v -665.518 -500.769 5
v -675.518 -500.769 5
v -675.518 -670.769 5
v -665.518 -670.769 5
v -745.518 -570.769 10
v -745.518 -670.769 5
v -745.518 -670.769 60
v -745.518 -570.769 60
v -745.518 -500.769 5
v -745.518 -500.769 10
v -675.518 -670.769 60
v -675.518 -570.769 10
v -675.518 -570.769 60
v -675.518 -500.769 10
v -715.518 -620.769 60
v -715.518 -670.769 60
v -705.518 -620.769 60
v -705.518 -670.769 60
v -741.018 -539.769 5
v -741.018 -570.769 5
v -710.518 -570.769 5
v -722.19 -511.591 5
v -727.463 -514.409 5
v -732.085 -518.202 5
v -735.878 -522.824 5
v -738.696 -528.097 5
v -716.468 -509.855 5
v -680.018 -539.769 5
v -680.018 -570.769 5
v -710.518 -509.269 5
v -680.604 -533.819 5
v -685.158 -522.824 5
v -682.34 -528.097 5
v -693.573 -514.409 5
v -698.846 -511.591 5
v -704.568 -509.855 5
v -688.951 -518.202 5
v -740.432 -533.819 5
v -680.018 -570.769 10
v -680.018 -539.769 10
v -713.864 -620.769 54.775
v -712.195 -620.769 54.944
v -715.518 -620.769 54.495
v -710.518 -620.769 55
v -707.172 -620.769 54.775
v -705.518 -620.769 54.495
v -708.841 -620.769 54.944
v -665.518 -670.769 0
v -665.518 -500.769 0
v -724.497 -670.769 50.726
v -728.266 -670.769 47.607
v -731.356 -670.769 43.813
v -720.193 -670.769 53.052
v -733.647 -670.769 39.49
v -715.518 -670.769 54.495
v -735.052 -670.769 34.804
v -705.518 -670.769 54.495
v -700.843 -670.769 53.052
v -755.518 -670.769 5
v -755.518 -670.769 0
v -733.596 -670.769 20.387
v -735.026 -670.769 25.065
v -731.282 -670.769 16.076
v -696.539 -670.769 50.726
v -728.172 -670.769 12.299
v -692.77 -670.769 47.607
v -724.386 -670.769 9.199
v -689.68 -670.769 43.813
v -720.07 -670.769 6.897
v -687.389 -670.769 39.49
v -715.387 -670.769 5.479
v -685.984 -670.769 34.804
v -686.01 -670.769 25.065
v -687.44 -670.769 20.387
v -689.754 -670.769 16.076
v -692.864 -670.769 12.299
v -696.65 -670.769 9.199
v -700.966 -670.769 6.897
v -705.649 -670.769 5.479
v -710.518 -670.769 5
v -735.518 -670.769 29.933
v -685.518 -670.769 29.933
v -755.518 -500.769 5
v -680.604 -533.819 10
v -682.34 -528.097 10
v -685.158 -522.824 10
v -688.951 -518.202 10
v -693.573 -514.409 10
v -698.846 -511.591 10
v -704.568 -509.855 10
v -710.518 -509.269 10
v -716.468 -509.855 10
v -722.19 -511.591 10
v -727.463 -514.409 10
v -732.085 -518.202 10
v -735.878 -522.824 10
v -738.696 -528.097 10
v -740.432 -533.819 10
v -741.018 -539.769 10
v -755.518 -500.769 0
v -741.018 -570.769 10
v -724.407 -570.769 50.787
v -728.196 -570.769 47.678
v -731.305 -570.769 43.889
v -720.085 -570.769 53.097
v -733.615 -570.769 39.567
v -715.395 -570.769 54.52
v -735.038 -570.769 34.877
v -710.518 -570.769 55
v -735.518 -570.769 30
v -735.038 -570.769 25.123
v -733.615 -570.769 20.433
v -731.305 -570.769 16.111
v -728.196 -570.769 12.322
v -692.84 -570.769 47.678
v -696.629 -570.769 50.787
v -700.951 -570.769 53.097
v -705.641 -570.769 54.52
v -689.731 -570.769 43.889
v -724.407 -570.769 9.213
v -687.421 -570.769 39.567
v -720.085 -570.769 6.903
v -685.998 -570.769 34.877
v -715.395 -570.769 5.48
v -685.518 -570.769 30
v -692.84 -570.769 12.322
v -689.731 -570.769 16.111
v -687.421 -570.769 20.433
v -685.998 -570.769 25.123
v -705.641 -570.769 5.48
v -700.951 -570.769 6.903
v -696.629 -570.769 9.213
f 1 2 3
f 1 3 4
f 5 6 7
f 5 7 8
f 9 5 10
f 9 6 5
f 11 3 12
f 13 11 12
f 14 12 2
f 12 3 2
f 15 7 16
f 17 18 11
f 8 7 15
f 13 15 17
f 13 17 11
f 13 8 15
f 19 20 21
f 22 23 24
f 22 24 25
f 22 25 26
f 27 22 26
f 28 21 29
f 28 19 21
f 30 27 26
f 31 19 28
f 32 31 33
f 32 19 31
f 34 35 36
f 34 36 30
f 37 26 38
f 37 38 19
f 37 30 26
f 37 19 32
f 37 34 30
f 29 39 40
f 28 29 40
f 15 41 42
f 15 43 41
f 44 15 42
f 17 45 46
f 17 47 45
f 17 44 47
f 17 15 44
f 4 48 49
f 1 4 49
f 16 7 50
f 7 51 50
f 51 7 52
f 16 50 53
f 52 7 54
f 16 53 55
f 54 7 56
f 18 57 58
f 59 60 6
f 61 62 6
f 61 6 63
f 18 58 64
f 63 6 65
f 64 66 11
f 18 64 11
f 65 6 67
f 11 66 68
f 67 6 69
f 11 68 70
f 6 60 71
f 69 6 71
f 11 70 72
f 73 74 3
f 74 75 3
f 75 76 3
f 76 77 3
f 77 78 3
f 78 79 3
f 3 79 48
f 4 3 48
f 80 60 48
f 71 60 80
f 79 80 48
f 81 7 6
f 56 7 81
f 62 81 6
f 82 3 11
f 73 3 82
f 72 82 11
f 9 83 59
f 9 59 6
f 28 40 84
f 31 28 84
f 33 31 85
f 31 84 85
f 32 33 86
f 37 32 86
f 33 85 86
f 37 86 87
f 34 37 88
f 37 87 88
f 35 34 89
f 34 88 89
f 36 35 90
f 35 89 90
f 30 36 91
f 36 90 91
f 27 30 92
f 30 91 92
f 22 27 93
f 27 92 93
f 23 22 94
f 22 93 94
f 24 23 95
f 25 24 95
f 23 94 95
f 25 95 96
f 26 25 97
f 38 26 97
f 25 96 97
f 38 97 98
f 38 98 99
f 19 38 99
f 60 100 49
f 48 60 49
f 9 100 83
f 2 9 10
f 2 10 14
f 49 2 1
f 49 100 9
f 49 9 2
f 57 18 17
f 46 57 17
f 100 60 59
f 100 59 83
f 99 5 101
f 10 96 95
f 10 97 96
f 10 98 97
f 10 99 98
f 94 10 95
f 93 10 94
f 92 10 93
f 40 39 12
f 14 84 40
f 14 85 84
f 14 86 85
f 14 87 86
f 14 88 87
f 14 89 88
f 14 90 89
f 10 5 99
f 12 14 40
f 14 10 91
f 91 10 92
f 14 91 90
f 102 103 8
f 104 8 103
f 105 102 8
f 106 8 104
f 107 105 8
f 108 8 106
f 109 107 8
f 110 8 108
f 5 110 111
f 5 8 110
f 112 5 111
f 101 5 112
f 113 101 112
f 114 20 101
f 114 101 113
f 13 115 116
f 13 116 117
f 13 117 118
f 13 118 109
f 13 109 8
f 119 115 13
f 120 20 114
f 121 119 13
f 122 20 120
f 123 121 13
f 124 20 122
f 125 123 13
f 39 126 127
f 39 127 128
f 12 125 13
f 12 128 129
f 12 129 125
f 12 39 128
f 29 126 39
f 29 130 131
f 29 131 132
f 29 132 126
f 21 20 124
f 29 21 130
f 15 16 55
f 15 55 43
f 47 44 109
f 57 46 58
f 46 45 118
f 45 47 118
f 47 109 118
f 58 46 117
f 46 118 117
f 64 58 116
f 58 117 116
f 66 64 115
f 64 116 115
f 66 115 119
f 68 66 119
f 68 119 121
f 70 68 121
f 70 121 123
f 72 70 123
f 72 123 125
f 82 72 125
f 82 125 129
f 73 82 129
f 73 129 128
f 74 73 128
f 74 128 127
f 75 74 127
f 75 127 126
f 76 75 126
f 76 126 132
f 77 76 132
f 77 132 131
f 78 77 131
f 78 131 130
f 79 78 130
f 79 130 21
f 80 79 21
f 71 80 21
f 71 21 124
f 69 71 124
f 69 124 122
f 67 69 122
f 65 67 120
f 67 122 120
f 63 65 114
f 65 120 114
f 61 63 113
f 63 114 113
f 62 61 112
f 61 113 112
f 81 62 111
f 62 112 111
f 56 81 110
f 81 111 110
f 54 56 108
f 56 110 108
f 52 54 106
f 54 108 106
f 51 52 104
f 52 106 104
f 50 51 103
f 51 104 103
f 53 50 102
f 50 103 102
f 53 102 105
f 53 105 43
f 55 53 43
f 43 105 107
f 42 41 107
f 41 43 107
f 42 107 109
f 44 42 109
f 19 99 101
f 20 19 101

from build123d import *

# Parameters (mm, degrees)
ESQUISSE1_W                  = 90
ESQUISSE1_H                  = 170
BOSS_EXTRU_1_DEPTH           = 5
ESQUISSE2_W                  = 70
ESQUISSE2_H                  = 100
BOSS_EXTRU_2_DEPTH           = 55
ENL_V_MAT_EXTRU_2_REACH      = 766.465
ESQUISSE4_R                  = 25
ENL_V_MAT_EXTRU_3_REACH      = 1014.096
ENL_V_MAT_EXTRU_3_END_RADIUS = 25
ESQUISSE5_W                  = 10
ESQUISSE5_H                  = 50
ESQUISSE6_W                  = 70
ESQUISSE6_H                  = 70
BOSS_EXTRU_3_DEPTH           = 5
ENL_V_MAT_EXTRU_4_DEPTH      = 5


with BuildPart() as part:
    # Esquisse1 → Boss.-Extru.1 (new body)
    with BuildSketch(Plane.XY):
        with Locations((-710.517990966, -585.769230769)):
            Rectangle(ESQUISSE1_W, ESQUISSE1_H)
    extrude(amount=BOSS_EXTRU_1_DEPTH)

    # Esquisse2 → Boss.-Extru.2 (add)
    with BuildSketch(Plane.XY.offset(5)):
        with Locations((-710.517990966, -620.769230769)):
            Rectangle(ESQUISSE2_W, ESQUISSE2_H)
    extrude(amount=BOSS_EXTRU_2_DEPTH)

    # Esquisse4 → Enlèv. mat.-Extru.2 (cut, up to next)
    with BuildSketch(Plane(origin=(0, -570.769230769, 0), x_dir=(1, 0, 0), z_dir=(0, 1, 0)), mode=Mode.PRIVATE) as enl_v_mat_extru_2_sk1:
        with Locations(Location((-710.517990966, -30, 0), (0, 0, 270))):
            Circle(ESQUISSE4_R)
    enl_v_mat_extru_2_tool1 = extrude(enl_v_mat_extru_2_sk1.sketch, amount=-ENL_V_MAT_EXTRU_2_REACH, mode=Mode.PRIVATE) & part.part
    add(enl_v_mat_extru_2_tool1.solids().sort_by_distance((-710.517991, -570.769231, 30))[0], mode=Mode.SUBTRACT)

    # Enlèv. mat.-Extru.3: up to this cylinder (the profile starts outside it)
    enl_v_mat_extru_3_end = Plane(origin=(-710.517990966, -645.769231, 30), z_dir=(0, 1, 0)) * Cylinder(ENL_V_MAT_EXTRU_3_END_RADIUS, 2079.192, mode=Mode.PRIVATE)
    # Esquisse5 → Enlèv. mat.-Extru.3 (cut, up to the surface)
    with BuildSketch(Plane.XY.offset(60), mode=Mode.PRIVATE) as enl_v_mat_extru_3_sk1:
        with Locations((-710.517990966, -645.769230769)):
            Rectangle(ESQUISSE5_W, ESQUISSE5_H)
    enl_v_mat_extru_3_tool1 = extrude(enl_v_mat_extru_3_sk1.sketch, amount=-ENL_V_MAT_EXTRU_3_REACH, mode=Mode.PRIVATE) - enl_v_mat_extru_3_end
    add(enl_v_mat_extru_3_tool1.solids().sort_by_distance((-710.517991, -645.769231, 60))[0], mode=Mode.SUBTRACT)

    # Esquisse6 → Boss.-Extru.3 (add)
    with BuildSketch(Plane.XY.offset(5)):
        with Locations((-710.517990966, -535.769230769)):
            Rectangle(ESQUISSE6_W, ESQUISSE6_H)
    extrude(amount=BOSS_EXTRU_3_DEPTH)

    # Esquisse7 → Enlèv. mat.-Extru.4 (cut)
    with BuildSketch(Plane.XY.offset(10)):
        with BuildLine():
            Line((-741.017990966, -539.769230769), (-741.017990966, -570.769230769))
            Line((-741.017990966, -570.769230769), (-680.017990966, -570.769230769))
            Line((-680.017990966, -570.769230769), (-680.017990966, -539.769230769))
            ThreePointArc((-680.017990966, -539.769230769), (-710.517990966, -509.269230769), (-741.017990966, -539.769230769))
        make_face()
    extrude(amount=-ENL_V_MAT_EXTRU_4_DEPTH, mode=Mode.SUBTRACT)


solid = part.part
